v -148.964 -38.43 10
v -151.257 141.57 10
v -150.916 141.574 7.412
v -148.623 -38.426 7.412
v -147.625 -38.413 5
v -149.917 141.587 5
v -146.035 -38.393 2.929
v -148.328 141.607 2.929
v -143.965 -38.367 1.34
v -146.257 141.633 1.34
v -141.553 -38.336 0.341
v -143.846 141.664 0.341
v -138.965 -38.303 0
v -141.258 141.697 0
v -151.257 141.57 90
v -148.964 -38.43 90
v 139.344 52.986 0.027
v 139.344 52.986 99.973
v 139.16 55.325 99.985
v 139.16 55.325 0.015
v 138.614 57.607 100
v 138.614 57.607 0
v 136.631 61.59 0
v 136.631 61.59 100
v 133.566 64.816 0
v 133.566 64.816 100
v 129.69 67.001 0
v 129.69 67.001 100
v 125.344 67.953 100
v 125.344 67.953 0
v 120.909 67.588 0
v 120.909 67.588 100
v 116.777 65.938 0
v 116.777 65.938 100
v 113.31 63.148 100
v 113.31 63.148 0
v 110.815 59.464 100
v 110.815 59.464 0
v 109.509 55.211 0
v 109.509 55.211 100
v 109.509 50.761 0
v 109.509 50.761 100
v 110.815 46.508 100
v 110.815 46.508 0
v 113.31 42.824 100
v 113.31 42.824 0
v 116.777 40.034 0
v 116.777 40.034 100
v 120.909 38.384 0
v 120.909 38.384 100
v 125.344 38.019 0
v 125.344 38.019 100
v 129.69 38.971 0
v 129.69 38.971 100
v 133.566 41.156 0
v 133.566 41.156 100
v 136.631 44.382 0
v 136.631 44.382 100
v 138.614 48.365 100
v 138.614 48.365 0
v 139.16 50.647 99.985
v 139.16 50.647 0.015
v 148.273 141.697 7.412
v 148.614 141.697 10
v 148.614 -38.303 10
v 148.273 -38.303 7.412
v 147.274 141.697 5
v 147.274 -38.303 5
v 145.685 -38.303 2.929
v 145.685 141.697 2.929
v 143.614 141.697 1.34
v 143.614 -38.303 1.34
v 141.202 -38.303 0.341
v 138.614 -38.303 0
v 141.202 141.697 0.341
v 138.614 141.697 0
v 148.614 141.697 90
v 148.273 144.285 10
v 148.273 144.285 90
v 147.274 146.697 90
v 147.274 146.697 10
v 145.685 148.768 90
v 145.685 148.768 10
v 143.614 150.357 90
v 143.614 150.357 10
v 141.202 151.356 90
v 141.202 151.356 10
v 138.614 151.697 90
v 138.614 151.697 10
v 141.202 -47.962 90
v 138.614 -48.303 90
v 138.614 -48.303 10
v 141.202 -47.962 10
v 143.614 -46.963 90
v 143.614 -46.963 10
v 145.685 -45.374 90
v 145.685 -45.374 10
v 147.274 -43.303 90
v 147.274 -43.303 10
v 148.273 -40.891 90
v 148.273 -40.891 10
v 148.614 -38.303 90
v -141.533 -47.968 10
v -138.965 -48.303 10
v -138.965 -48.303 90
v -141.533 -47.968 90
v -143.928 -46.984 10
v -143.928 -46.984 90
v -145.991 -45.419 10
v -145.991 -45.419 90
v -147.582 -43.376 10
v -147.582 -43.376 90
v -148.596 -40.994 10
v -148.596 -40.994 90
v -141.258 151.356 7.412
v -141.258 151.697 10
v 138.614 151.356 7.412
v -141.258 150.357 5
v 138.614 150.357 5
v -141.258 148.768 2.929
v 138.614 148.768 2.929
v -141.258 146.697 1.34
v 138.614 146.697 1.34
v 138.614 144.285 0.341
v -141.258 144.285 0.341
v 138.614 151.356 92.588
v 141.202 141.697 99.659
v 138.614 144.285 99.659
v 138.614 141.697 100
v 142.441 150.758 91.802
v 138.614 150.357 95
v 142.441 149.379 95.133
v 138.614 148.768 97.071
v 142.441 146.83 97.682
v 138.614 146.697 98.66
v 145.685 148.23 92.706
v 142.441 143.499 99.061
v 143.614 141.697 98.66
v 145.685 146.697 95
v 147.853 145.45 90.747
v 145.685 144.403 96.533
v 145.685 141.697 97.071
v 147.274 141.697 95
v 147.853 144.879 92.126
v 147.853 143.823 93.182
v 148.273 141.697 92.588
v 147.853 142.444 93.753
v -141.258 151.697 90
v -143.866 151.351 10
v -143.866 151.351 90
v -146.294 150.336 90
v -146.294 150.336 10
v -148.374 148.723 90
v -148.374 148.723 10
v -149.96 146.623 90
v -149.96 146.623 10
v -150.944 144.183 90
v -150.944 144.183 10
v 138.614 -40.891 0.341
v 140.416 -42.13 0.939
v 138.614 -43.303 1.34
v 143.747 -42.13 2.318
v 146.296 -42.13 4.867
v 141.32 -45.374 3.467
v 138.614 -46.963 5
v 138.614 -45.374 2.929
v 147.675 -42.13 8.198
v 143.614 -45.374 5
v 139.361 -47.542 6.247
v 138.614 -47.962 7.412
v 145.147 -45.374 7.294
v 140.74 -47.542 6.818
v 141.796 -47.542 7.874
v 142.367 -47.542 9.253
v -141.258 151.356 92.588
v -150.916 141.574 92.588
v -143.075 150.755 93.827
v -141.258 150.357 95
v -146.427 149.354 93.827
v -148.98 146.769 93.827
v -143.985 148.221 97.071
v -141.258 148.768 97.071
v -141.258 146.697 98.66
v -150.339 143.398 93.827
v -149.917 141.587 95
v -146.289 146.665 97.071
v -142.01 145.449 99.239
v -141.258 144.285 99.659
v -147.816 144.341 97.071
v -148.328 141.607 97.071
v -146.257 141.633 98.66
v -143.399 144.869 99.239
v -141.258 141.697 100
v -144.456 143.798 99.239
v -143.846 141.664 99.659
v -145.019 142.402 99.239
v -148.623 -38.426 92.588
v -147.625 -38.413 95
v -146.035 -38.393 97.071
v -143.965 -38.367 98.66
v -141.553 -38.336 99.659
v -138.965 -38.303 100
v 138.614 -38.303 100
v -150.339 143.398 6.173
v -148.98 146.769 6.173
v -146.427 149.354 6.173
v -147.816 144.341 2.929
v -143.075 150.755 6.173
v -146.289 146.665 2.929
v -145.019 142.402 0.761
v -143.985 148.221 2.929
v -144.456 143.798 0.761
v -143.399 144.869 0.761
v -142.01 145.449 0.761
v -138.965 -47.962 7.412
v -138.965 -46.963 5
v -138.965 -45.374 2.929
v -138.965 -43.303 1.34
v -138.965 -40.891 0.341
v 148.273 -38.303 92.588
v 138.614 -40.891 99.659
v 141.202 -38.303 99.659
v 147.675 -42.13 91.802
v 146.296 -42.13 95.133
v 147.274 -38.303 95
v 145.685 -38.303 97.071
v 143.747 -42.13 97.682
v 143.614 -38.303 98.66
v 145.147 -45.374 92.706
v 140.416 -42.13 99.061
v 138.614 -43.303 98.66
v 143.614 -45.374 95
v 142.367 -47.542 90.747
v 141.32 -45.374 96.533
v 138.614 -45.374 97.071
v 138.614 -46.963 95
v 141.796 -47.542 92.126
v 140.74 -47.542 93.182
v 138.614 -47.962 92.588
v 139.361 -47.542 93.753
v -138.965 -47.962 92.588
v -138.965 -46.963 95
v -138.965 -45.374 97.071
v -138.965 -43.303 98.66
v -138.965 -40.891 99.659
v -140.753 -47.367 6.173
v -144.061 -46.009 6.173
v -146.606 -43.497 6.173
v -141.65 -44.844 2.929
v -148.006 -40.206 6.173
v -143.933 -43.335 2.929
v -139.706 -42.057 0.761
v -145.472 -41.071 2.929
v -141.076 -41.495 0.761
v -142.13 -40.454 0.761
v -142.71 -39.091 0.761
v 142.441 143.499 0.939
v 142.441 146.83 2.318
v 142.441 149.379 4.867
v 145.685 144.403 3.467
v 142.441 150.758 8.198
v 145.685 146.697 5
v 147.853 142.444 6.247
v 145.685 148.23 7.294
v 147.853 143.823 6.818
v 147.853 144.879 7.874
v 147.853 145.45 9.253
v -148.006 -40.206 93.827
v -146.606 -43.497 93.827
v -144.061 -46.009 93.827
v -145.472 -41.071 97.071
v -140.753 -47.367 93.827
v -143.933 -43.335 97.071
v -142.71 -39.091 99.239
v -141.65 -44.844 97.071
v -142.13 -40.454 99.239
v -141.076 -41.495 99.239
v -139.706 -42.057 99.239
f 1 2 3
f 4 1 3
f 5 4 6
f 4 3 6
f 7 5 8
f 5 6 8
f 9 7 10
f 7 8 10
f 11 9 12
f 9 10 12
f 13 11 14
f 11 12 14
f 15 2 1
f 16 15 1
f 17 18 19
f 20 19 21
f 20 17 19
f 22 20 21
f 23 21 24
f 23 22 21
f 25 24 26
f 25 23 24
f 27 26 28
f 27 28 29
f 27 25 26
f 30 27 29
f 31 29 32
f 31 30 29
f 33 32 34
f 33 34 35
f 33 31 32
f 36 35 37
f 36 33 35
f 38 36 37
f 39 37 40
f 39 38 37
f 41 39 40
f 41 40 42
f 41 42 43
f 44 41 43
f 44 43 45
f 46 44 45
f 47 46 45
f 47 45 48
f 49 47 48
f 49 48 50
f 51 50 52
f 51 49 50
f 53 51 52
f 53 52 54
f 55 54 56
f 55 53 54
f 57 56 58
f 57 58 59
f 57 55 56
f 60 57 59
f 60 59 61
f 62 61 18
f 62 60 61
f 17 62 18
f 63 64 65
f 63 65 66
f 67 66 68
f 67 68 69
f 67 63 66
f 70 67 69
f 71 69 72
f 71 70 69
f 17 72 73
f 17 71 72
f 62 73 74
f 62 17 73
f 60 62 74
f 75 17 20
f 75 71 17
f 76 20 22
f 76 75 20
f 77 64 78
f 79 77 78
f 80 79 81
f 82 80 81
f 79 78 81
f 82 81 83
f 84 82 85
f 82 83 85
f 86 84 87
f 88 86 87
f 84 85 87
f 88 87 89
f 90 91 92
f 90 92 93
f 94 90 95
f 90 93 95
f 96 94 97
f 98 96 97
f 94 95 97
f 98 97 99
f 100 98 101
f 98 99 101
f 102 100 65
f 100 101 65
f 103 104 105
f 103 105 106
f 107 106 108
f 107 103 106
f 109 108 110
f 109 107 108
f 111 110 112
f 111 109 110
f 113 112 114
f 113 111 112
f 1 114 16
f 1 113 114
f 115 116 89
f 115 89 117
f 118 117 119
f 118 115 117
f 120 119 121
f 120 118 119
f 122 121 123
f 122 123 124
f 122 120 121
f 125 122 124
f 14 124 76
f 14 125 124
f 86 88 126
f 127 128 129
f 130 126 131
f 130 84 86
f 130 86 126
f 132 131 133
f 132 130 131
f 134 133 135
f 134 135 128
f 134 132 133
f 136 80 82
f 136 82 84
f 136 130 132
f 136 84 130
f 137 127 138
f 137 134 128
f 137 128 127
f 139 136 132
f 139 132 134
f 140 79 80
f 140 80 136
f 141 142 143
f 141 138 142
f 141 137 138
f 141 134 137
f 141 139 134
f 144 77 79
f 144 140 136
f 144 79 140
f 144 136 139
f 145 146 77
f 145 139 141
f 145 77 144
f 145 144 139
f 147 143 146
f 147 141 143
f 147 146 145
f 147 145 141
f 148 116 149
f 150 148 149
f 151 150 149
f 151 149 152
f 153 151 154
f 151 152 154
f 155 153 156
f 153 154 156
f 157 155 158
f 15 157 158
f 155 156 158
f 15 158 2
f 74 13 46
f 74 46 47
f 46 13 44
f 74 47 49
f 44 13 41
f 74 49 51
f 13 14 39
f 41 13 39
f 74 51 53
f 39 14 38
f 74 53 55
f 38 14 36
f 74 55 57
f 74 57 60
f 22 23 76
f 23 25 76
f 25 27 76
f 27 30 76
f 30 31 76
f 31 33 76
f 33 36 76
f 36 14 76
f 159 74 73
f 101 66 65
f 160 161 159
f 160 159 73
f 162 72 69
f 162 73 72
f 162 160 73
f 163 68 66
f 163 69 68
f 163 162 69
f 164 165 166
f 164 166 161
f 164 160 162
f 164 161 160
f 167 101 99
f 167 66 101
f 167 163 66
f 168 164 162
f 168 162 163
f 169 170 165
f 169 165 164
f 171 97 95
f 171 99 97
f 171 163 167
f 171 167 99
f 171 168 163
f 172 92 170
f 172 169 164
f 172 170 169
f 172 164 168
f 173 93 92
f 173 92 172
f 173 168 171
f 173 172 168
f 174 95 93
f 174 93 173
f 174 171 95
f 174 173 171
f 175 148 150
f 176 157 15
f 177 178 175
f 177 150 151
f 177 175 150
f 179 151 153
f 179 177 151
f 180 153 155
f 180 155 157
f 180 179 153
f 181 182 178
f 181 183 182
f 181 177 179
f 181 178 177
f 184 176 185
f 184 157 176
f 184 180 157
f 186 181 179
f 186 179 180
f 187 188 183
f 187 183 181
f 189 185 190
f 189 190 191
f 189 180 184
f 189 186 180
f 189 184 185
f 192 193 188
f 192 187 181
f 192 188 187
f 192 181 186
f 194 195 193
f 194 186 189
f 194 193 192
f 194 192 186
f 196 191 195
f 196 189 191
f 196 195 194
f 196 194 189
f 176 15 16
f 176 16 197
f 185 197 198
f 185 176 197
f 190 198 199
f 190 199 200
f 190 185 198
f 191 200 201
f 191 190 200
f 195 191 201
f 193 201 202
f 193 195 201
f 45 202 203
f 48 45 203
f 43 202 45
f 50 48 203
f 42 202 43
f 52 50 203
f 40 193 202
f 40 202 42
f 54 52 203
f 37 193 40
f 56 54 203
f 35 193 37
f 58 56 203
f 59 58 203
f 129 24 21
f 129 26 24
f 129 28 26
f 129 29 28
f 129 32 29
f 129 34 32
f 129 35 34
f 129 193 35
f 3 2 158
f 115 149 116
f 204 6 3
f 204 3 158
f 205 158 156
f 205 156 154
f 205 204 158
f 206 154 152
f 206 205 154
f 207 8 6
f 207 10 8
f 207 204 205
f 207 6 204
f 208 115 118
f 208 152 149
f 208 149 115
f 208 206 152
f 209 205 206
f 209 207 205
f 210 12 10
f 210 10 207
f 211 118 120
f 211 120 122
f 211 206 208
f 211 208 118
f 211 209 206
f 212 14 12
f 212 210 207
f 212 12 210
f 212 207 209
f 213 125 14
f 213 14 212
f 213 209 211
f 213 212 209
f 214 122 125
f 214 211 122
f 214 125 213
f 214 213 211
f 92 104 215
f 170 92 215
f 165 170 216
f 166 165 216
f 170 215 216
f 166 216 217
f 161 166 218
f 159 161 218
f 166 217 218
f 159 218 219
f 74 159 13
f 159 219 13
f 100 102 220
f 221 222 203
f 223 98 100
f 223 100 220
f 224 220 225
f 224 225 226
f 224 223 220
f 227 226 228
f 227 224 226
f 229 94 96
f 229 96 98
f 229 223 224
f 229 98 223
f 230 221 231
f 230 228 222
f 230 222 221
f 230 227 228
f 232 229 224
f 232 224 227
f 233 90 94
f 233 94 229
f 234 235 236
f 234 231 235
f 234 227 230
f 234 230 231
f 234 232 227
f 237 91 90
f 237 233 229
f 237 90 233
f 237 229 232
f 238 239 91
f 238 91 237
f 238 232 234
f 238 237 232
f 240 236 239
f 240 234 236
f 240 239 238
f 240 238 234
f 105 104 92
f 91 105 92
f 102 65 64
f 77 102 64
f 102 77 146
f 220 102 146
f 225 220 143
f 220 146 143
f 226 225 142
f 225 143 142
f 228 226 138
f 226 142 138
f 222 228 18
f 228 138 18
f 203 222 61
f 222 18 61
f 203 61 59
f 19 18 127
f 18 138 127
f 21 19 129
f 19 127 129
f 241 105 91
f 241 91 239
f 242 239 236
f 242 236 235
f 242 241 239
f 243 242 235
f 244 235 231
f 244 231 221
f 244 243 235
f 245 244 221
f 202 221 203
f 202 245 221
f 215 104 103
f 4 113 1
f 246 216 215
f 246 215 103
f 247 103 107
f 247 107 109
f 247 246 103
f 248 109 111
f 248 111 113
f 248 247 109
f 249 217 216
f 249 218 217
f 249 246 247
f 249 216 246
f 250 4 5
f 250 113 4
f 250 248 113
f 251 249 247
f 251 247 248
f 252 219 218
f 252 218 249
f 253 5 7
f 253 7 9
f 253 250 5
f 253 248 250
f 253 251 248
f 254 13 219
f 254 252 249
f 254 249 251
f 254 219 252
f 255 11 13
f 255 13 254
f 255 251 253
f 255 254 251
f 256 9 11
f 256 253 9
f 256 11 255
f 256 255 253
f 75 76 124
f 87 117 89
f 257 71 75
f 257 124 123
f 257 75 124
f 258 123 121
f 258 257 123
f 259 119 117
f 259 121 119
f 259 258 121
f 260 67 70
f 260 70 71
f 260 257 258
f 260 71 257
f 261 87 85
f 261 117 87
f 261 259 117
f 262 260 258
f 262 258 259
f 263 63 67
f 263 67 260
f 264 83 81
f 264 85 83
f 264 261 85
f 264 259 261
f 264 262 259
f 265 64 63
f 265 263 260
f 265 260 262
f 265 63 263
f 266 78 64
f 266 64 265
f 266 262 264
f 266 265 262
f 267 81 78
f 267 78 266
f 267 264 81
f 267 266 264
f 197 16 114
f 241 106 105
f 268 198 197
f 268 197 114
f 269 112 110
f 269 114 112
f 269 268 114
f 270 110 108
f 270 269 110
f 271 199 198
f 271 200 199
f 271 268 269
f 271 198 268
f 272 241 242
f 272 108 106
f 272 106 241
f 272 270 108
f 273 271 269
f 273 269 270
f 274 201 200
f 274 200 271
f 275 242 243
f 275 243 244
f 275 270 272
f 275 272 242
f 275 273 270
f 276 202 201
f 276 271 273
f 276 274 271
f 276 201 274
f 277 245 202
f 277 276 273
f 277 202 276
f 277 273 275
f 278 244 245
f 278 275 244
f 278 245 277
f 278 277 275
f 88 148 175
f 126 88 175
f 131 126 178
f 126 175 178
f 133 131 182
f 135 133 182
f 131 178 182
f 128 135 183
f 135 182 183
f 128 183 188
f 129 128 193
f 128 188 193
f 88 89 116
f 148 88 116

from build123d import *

# Parameters (mm, degrees)
F0_R         = 15
F1_DEPTH     = 100
F2_T1_DEPTH  = 180
F2_T3_DEPTH  = 277.5790250274
F2_T5_DEPTH  = 80
F2_T7_DEPTH  = 279.8718117474
F2_T9_DEPTH  = 180.014601827
F2_S13_W     = 10
F2_S13_H     = 10
F2_T14_DEPTH = 10
F2_S19_W     = 10
F2_S19_H     = 10
F2_T20_DEPTH = 10
F2_T26_DEPTH = 10
F2_S31_W     = 10
F2_S31_H     = 10
F2_T32_DEPTH = 10
F2_T38_DEPTH = 10
F2_S43_W     = 10
F2_S43_H     = 10
F2_T44_DEPTH = 10
F2_T50_DEPTH = 10
F2_T56_DEPTH = 10


# Not quite as in the source:
# - a fillet or chamfer that OpenCascade refuses, or shapes differently, is made with other operations: its cross-section is extruded or revolved along the edge and cut away or added


with BuildPart() as f1:
    # F0 (on Top) → F1 (new body)
    with BuildSketch(Plane.XY):
        Polygon((148.6140583592, 151.6970589757), (-151.3859416408, 151.6970589757), (-148.8384008408, -48.3029410243), (148.6140583592, -48.3029410243), align=None)
        with Locations((124.343521893, 52.9859960079)):
            Circle(F0_R, mode=Mode.SUBTRACT)
    extrude(amount=F1_DEPTH)

    # F2: fillet of radius 10 on 12 edges, made by hand

    # F2_s2 → F2_t1 (cut)
    with BuildSketch(Plane.XZ.offset(-141.6970589757)):
        with BuildLine():
            ThreePointArc((148.6140583592, 90), (145.6851261711, 97.0710678119), (138.6140583592, 100))
            Line((138.6140583592, 100), (148.6140583592, 100))
            Line((148.6140583592, 100), (148.6140583592, 90))
        make_face()
        with BuildLine():
            ThreePointArc((148.6140583592, 10), (145.6851261711, 2.9289321881), (138.6140583592, 0))
            Line((138.6140583592, 0), (148.6140583592, 0))
            Line((148.6140583592, 0), (148.6140583592, 10))
        make_face()
    extrude(amount=F2_T1_DEPTH, mode=Mode.SUBTRACT)

    # F2_s4 → F2_t3 (cut)
    with BuildSketch(Plane.YZ.offset(-138.9649666681)):
        with BuildLine():
            ThreePointArc((-48.3029410243, 90), (-45.3740088362, 97.0710678119), (-38.3029410243, 100))
            Line((-38.3029410243, 100), (-48.3029410243, 100))
            Line((-48.3029410243, 100), (-48.3029410243, 90))
        make_face()
        with BuildLine():
            ThreePointArc((-48.3029410243, 10), (-45.3740088362, 2.9289321881), (-38.3029410243, 0))
            Line((-38.3029410243, 0), (-48.3029410243, 0))
            Line((-48.3029410243, 0), (-48.3029410243, 10))
        make_face()
    extrude(amount=F2_T3_DEPTH, mode=Mode.SUBTRACT)

    # F2_s6 → F2_t5 (cut)
    with BuildSketch(Plane.XY.offset(10)):
        with BuildLine():
            ThreePointArc((138.6140583592, -48.3029410243), (145.6851261711, -45.3740088362), (148.6140583592, -38.3029410243))
            Line((148.6140583592, -38.3029410243), (148.6140583592, -48.3029410243))
            Line((148.6140583592, -48.3029410243), (138.6140583592, -48.3029410243))
        make_face()
        with BuildLine():
            ThreePointArc((148.6140583592, 141.6970589757), (145.6851261711, 148.7681267876), (138.6140583592, 151.6970589757))
            Line((138.6140583592, 151.6970589757), (148.6140583592, 151.6970589757))
            Line((148.6140583592, 151.6970589757), (148.6140583592, 141.6970589757))
        make_face()
        with BuildLine():
            ThreePointArc((-138.9649666681, -48.3029410243), (-145.9908592421, -45.4188972875), (-148.9641555213, -38.4303077322))
            Line((-148.9641555213, -38.4303077322), (-148.8384008408, -48.3029410243))
            Line((-148.8384008408, -48.3029410243), (-138.9649666681, -48.3029410243))
        make_face()
        with BuildLine():
            ThreePointArc((-141.2577533882, 151.6970589757), (-148.3737096513, 148.7229515496), (-151.2569422414, 141.5696922678))
            Line((-151.2569422414, 141.5696922678), (-151.3859416408, 151.6970589757))
            Line((-151.3859416408, 151.6970589757), (-141.2577533882, 151.6970589757))
        make_face()
    extrude(amount=F2_T5_DEPTH, mode=Mode.SUBTRACT)

    # F2_s8 → F2_t7 (cut)
    with BuildSketch(Plane.YZ.offset(-141.2577533882)):
        with BuildLine():
            ThreePointArc((151.6970589757, 10), (148.7681267876, 2.9289321881), (141.6970589757, 0))
            Line((141.6970589757, 0), (151.6970589757, 0))
            Line((151.6970589757, 0), (151.6970589757, 10))
        make_face()
        with BuildLine():
            ThreePointArc((151.6970589757, 90), (148.7681267876, 97.0710678119), (141.6970589757, 100))
            Line((141.6970589757, 100), (151.6970589757, 100))
            Line((151.6970589757, 100), (151.6970589757, 90))
        make_face()
    extrude(amount=F2_T7_DEPTH, mode=Mode.SUBTRACT)

    # F2_s10 → F2_t9 (cut)
    with BuildSketch(Plane(origin=(-1.8275176256, 143.4730800475, 0), x_dir=(0, 0, 1), z_dir=(0.0127366708, -0.9999188853, 0))):
        with BuildLine():
            ThreePointArc((10, 149.4415465191), (2.9289321881, 146.512614331), (0, 139.4415465191))
            Line((0, 139.4415465191), (0, 149.4415465191))
            Line((0, 149.4415465191), (10, 149.4415465191))
        make_face()
        with BuildLine():
            ThreePointArc((90, 149.4415465191), (97.0710678119, 146.512614331), (100, 139.4415465191))
            Line((100, 139.4415465191), (100, 149.4415465191))
            Line((100, 149.4415465191), (90, 149.4415465191))
        make_face()
    extrude(amount=F2_T9_DEPTH, mode=Mode.SUBTRACT)


with BuildPart() as f2_tool12:
    # F2_s13 → F2_t14 (new body)
    with BuildSketch(Plane.XZ.offset(38.3029410243)):
        with Locations((143.6140583592, 95)):
            Rectangle(F2_S13_W, F2_S13_H)
    extrude(amount=F2_T14_DEPTH)

    # F2_s15 → F2_t16 (revolve, cut)
    with BuildSketch(Plane(origin=(138.6140583592, -38.3029410243, 90), x_dir=(-0.7071067812, 0, -0.7071067812), z_dir=(-0.7071067812, 0, 0.7071067812))):
        with BuildLine():
            ThreePointArc((0, -10), (10, 0), (0, 10))
            Line((0, 10), (0, -10))
        make_face()
    revolve(axis=Axis((138.6140583592, -38.3029410243, 90), (0, -1, 0)), mode=Mode.SUBTRACT)


with BuildPart() as f1_1:
    add(f1.part)

    # F2_t11: cut F2_tool12
    add(f2_tool12.part, mode=Mode.SUBTRACT)


with BuildPart() as f2_tool18:
    # F2_s19 → F2_t20 (new body)
    with BuildSketch(Plane.YZ.offset(138.6140583592)):
        with Locations((146.6970589757, 95)):
            Rectangle(F2_S19_W, F2_S19_H)
    extrude(amount=F2_T20_DEPTH)

    # F2_s21 → F2_t22 (revolve, cut)
    with BuildSketch(Plane(origin=(138.6140583592, 141.6970589757, 90), x_dir=(0, -0.7071067812, -0.7071067812), z_dir=(0, -0.7071067812, 0.7071067812))):
        with BuildLine():
            ThreePointArc((0, -10), (10, 0), (0, 10))
            Line((0, 10), (0, -10))
        make_face()
    revolve(axis=Axis((138.6140583592, 141.6970589757, 90), (1, 0, 0)), mode=Mode.SUBTRACT)


with BuildPart() as f1_2:
    add(f1_1.part)

    # F2_t17: cut F2_tool18
    add(f2_tool18.part, mode=Mode.SUBTRACT)


with BuildPart() as f2_tool24:
    # F2_s25 → F2_t26 (new body)
    with BuildSketch(Plane.XY.offset(90)):
        Polygon((-138.9649666681, -38.3029410243), (-138.9649666681, -48.3029410243), (-148.8384008408, -48.3029410243), (-148.9641555213, -38.4303077322), align=None)
    extrude(amount=F2_T26_DEPTH)

    # F2_s27 → F2_t28 (revolve, cut)
    with BuildSketch(Plane(origin=(-138.9649666681, -38.3029410243, 90), x_dir=(0.7025892574, 0.7115956263, 0), z_dir=(0.7115956263, -0.7025892574, 0))):
        with BuildLine():
            ThreePointArc((0, -10), (10, 0), (0, 10))
            Line((0, 10), (0, -10))
        make_face()
    revolve(axis=Axis((-138.9649666681, -38.3029410243, 90), (0, 0, 1)), mode=Mode.SUBTRACT)


with BuildPart() as f1_3:
    add(f1_2.part)

    # F2_t23: cut F2_tool24
    add(f2_tool24.part, mode=Mode.SUBTRACT)


with BuildPart() as f2_tool30:
    # F2_s31 → F2_t32 (new body)
    with BuildSketch(Plane.XZ.offset(38.3029410243)):
        with Locations((143.6140583592, 5)):
            Rectangle(F2_S31_W, F2_S31_H)
    extrude(amount=F2_T32_DEPTH)

    # F2_s33 → F2_t34 (revolve, cut)
    with BuildSketch(Plane(origin=(138.6140583592, -38.3029410243, 10), x_dir=(-0.7071067812, 0, 0.7071067812), z_dir=(0.7071067812, 0, 0.7071067812))):
        with BuildLine():
            ThreePointArc((0, -10), (10, 0), (0, 10))
            Line((0, 10), (0, -10))
        make_face()
    revolve(axis=Axis((138.6140583592, -38.3029410243, 10), (0, -1, 0)), mode=Mode.SUBTRACT)


with BuildPart() as f1_4:
    add(f1_3.part)

    # F2_t29: cut F2_tool30
    add(f2_tool30.part, mode=Mode.SUBTRACT)


with BuildPart() as f2_tool36:
    # F2_s37 → F2_t38 (new body)
    with BuildSketch(Plane.XY.offset(10)):
        Polygon((-138.9649666681, -38.3029410243), (-138.9649666681, -48.3029410243), (-148.8384008408, -48.3029410243), (-148.9641555213, -38.4303077322), align=None)
    extrude(amount=-F2_T38_DEPTH)

    # F2_s39 → F2_t40 (revolve, cut)
    with BuildSketch(Plane(origin=(-138.9649666681, -38.3029410243, 10), x_dir=(0.7025892574, 0.7115956263, 0), z_dir=(-0.7115956263, 0.7025892574, 0))):
        with BuildLine():
            ThreePointArc((0, -10), (10, 0), (0, 10))
            Line((0, 10), (0, -10))
        make_face()
    revolve(axis=Axis((-138.9649666681, -38.3029410243, 10), (0, 0, -1)), mode=Mode.SUBTRACT)


with BuildPart() as f1_5:
    add(f1_4.part)

    # F2_t35: cut F2_tool36
    add(f2_tool36.part, mode=Mode.SUBTRACT)


with BuildPart() as f2_tool42:
    # F2_s43 → F2_t44 (new body)
    with BuildSketch(Plane.YZ.offset(138.6140583592)):
        with Locations((146.6970589757, 5)):
            Rectangle(F2_S43_W, F2_S43_H)
    extrude(amount=F2_T44_DEPTH)

    # F2_s45 → F2_t46 (revolve, cut)
    with BuildSketch(Plane(origin=(138.6140583592, 141.6970589757, 10), x_dir=(0, -0.7071067812, 0.7071067812), z_dir=(0, 0.7071067812, 0.7071067812))):
        with BuildLine():
            ThreePointArc((0, -10), (10, 0), (0, 10))
            Line((0, 10), (0, -10))
        make_face()
    revolve(axis=Axis((138.6140583592, 141.6970589757, 10), (1, 0, 0)), mode=Mode.SUBTRACT)


with BuildPart() as f1_6:
    add(f1_5.part)

    # F2_t41: cut F2_tool42
    add(f2_tool42.part, mode=Mode.SUBTRACT)


with BuildPart() as f2_tool48:
    # F2_s49 → F2_t50 (new body)
    with BuildSketch(Plane.XY.offset(10)):
        Polygon((-141.2577533882, 141.6970589757), (-141.2577533882, 151.6970589757), (-151.3859416408, 151.6970589757), (-151.2569422414, 141.5696922678), align=None)
    extrude(amount=-F2_T50_DEPTH)

    # F2_s51 → F2_t52 (revolve, cut)
    with BuildSketch(Plane(origin=(-141.2577533882, 141.6970589757, 10), x_dir=(0.7115956263, -0.7025892574, 0), z_dir=(0.7025892574, 0.7115956263, 0))):
        with BuildLine():
            ThreePointArc((0, -10), (10, 0), (0, 10))
            Line((0, 10), (0, -10))
        make_face()
    revolve(axis=Axis((-141.2577533882, 141.6970589757, 10), (0, 0, -1)), mode=Mode.SUBTRACT)


with BuildPart() as f1_7:
    add(f1_6.part)

    # F2_t47: cut F2_tool48
    add(f2_tool48.part, mode=Mode.SUBTRACT)


with BuildPart() as f2_tool54:
    # F2_s55 → F2_t56 (new body)
    with BuildSketch(Plane.XY.offset(90)):
        Polygon((-141.2577533882, 141.6970589757), (-141.2577533882, 151.6970589757), (-151.3859416408, 151.6970589757), (-151.2569422414, 141.5696922678), align=None)
    extrude(amount=F2_T56_DEPTH)

    # F2_s57 → F2_t58 (revolve, cut)
    with BuildSketch(Plane(origin=(-141.2577533882, 141.6970589757, 90), x_dir=(0.7115956263, -0.7025892574, 0), z_dir=(-0.7025892574, -0.7115956263, 0))):
        with BuildLine():
            ThreePointArc((0, -10), (10, 0), (0, 10))
            Line((0, 10), (0, -10))
        make_face()
    revolve(axis=Axis((-141.2577533882, 141.6970589757, 90), (0, 0, 1)), mode=Mode.SUBTRACT)


with BuildPart() as f1_8:
    add(f1_7.part)

    # F2_t53: cut F2_tool54
    add(f2_tool54.part, mode=Mode.SUBTRACT)


solid = f1_8.part
